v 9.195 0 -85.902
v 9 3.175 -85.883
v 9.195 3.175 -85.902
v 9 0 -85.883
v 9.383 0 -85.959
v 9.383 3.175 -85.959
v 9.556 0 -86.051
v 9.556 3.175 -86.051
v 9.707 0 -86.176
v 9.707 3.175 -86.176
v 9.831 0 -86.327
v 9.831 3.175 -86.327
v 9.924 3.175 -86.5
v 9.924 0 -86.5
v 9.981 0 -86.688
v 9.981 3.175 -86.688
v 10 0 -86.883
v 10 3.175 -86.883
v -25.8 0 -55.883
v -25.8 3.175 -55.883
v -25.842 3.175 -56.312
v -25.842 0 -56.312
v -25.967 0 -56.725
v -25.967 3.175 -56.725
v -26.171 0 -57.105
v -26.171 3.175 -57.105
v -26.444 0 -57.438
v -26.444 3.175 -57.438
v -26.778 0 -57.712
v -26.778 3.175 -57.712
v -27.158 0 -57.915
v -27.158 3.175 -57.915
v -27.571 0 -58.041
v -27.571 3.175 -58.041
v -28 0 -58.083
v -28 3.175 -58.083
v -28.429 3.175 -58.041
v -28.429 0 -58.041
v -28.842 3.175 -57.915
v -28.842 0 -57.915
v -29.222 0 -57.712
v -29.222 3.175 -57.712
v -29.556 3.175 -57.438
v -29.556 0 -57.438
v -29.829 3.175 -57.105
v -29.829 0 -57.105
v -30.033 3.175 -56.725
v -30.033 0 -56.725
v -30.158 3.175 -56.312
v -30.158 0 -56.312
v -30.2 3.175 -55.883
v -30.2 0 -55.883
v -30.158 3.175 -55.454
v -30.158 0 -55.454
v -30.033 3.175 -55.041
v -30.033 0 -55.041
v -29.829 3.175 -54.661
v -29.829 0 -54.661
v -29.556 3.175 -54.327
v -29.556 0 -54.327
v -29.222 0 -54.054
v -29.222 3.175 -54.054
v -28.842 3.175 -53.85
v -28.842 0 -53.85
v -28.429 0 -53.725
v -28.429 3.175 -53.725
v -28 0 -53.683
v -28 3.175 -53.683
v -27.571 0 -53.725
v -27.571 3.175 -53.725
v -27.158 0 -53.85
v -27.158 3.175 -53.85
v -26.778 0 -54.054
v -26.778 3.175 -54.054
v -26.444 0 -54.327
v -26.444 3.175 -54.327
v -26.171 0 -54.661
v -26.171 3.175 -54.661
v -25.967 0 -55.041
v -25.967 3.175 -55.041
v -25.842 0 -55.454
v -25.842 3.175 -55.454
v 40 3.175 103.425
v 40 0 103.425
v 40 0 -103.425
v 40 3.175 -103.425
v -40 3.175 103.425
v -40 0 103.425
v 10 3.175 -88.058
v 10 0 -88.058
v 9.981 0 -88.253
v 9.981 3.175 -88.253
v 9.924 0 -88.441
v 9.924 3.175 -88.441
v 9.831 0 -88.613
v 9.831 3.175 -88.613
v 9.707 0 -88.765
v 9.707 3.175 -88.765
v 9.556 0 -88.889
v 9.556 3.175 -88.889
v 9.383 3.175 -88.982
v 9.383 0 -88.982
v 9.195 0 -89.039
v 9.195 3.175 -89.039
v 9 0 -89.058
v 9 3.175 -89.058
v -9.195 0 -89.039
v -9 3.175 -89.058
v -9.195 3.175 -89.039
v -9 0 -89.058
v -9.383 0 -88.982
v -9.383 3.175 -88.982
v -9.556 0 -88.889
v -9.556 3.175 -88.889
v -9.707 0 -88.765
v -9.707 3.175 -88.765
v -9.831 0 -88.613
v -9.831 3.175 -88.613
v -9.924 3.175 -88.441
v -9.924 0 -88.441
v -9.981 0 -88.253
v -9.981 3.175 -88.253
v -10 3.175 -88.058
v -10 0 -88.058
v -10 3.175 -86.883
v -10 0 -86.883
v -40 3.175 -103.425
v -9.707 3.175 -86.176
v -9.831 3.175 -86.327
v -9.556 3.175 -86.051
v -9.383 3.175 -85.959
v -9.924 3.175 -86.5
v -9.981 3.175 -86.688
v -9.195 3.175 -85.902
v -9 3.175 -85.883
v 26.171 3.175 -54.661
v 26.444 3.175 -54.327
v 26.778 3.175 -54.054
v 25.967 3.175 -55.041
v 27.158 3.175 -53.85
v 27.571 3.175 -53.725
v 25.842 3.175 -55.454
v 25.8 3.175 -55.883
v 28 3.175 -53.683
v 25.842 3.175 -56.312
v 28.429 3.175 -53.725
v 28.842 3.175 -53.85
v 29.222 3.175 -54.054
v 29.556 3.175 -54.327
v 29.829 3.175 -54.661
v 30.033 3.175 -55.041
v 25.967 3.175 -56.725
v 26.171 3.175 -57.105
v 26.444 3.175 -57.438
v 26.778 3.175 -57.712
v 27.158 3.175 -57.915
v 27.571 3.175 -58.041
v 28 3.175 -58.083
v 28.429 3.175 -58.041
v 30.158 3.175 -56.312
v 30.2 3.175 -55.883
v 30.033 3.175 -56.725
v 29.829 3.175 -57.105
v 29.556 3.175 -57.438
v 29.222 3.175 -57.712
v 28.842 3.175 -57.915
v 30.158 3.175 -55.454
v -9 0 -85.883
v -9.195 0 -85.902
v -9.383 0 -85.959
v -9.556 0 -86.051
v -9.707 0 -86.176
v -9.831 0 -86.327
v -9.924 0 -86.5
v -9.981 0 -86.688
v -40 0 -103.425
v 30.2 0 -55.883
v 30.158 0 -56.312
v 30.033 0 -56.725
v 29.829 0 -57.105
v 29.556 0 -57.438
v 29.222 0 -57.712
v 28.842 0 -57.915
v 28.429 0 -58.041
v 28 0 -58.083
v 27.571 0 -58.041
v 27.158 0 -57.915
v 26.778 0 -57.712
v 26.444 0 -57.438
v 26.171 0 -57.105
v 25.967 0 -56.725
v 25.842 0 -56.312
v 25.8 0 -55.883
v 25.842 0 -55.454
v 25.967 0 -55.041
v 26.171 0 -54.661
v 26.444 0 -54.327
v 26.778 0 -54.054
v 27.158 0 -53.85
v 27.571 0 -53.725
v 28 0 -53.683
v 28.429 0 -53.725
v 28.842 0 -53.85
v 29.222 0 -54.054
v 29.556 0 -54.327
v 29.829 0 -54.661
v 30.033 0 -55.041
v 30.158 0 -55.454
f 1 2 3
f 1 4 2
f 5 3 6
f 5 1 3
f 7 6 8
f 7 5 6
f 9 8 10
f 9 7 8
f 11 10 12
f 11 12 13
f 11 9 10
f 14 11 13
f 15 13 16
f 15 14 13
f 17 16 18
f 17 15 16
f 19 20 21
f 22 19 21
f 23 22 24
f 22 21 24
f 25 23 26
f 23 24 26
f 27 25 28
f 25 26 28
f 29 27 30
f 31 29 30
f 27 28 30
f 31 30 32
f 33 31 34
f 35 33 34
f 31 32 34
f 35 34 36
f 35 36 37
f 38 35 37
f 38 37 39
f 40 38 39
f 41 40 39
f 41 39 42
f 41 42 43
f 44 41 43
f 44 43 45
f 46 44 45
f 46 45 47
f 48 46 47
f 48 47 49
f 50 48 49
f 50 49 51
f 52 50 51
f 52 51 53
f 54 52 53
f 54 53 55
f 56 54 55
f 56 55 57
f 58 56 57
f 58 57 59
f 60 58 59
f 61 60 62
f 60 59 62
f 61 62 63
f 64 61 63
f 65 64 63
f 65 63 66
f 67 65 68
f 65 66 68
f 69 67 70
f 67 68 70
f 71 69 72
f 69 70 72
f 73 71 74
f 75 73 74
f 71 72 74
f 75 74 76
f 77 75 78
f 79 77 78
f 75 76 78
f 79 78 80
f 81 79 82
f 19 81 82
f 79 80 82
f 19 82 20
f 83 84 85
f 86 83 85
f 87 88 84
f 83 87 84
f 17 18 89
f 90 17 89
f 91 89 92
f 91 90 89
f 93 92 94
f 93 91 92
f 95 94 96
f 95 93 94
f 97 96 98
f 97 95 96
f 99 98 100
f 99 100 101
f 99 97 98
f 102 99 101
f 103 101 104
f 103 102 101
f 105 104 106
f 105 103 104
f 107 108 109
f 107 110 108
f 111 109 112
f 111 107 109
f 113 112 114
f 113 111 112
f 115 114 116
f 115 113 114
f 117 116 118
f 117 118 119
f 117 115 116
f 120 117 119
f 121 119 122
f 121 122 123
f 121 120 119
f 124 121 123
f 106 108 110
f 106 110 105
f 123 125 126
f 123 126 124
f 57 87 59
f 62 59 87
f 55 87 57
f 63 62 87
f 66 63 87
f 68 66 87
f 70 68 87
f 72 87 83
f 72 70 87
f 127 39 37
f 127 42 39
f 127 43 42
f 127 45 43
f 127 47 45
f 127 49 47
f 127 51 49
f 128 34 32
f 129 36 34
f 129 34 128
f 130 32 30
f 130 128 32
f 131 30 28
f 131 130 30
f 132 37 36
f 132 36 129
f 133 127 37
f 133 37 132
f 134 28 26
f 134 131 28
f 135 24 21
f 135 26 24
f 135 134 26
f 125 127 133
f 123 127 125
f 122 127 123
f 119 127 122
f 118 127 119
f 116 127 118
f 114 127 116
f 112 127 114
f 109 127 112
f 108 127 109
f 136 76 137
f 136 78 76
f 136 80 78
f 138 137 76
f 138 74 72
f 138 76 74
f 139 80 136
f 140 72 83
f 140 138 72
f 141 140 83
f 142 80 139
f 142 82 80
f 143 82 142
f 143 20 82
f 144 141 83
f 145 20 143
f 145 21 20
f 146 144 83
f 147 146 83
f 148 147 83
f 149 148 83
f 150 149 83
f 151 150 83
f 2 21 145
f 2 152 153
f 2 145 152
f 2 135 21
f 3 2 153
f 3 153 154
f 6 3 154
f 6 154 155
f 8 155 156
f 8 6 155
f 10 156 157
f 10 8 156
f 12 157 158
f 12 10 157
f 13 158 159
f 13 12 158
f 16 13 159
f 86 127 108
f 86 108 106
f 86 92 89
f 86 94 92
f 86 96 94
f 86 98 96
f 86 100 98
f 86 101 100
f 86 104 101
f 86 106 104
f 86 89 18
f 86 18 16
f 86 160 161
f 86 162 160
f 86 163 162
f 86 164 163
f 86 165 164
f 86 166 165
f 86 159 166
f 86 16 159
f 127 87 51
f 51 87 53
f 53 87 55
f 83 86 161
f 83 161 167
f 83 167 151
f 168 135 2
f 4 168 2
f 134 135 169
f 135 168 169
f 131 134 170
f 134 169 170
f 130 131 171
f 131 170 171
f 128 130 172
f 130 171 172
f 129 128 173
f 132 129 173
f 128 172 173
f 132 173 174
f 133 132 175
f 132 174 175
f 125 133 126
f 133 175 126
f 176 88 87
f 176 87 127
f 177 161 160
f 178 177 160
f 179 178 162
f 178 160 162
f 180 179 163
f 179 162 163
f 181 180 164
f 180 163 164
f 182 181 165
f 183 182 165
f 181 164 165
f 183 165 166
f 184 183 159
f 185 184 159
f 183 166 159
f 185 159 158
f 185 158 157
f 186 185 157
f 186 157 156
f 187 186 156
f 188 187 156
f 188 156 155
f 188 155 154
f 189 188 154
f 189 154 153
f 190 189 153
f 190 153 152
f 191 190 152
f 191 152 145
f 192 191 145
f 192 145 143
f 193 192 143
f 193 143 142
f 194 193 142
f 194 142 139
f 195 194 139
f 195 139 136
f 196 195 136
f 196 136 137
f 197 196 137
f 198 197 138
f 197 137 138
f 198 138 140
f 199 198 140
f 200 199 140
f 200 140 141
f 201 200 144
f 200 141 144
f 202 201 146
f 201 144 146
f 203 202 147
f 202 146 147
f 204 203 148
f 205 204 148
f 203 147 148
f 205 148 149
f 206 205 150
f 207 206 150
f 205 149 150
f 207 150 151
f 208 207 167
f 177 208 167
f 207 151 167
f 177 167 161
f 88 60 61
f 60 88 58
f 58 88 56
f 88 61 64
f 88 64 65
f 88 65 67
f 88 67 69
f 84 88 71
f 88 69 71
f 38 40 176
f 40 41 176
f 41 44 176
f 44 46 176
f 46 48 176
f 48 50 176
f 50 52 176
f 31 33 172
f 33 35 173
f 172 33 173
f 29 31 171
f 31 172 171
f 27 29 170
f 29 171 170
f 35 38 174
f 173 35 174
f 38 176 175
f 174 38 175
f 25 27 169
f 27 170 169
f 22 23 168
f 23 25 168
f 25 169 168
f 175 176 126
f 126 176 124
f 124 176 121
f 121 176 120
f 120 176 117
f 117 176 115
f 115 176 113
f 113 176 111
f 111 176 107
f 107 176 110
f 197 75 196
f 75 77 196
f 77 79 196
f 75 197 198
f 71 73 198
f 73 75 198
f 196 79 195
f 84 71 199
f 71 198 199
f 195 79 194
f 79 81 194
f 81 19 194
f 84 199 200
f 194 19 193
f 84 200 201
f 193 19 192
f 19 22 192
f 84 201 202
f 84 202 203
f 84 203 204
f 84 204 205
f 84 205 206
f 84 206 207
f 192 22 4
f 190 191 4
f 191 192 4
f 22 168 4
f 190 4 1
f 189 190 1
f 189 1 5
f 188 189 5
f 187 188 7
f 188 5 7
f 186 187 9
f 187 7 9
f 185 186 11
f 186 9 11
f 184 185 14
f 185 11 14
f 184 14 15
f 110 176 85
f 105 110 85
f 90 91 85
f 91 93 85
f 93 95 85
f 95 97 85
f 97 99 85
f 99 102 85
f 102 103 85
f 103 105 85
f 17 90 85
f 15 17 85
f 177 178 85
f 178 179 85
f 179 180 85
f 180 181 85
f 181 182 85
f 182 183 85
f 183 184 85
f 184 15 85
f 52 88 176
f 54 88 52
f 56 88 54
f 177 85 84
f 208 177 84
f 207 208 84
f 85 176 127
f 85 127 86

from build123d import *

# Parameters (mm, degrees)
SKETCH2_W           = 80
SKETCH2_H           = 206.85
BOSS_EXTRUDE1_DEPTH = 3.175
SKETCH3_R           = 2.2
SKETCH3_W           = 20
SKETCH3_H           = 3.175
CUT_EXTRUDE1_DEPTH  = 4.175
FILLET1_R           = 1


with BuildPart() as part:
    # Sketch2 → Boss-Extrude1 (new body)
    with BuildSketch(Plane(origin=(0, 0, 0), x_dir=(1, 0, 0), z_dir=(0, 1, 0))):
        Rectangle(SKETCH2_W, SKETCH2_H)
    extrude(amount=BOSS_EXTRUDE1_DEPTH)

    # Sketch3 → Cut-Extrude1 (cut, through all)
    with BuildSketch(Plane(origin=(0, 3.175, 0), x_dir=(1, 0, 0), z_dir=(0, 1, 0))):
        with Locations((28, 55.882836501)):
            Circle(SKETCH3_R)
        with Locations((-28, 55.882836501)):
            Circle(SKETCH3_R)
        with Locations((0, 87.470336501)):
            Rectangle(SKETCH3_W, SKETCH3_H)
    extrude(amount=-CUT_EXTRUDE1_DEPTH, mode=Mode.SUBTRACT)

    # Fillet1
    fillet1_edges = [part.edges().sort_by_distance(p)[0] for p in [
        (10, 1.5875, -89.057836501),
        (10, 1.5875, -85.882836501),
        (-10, 1.5875, -85.882836501),
        (-10, 1.5875, -89.057836501),
    ]]
    fillet(fillet1_edges, radius=FILLET1_R)


solid = part.part
